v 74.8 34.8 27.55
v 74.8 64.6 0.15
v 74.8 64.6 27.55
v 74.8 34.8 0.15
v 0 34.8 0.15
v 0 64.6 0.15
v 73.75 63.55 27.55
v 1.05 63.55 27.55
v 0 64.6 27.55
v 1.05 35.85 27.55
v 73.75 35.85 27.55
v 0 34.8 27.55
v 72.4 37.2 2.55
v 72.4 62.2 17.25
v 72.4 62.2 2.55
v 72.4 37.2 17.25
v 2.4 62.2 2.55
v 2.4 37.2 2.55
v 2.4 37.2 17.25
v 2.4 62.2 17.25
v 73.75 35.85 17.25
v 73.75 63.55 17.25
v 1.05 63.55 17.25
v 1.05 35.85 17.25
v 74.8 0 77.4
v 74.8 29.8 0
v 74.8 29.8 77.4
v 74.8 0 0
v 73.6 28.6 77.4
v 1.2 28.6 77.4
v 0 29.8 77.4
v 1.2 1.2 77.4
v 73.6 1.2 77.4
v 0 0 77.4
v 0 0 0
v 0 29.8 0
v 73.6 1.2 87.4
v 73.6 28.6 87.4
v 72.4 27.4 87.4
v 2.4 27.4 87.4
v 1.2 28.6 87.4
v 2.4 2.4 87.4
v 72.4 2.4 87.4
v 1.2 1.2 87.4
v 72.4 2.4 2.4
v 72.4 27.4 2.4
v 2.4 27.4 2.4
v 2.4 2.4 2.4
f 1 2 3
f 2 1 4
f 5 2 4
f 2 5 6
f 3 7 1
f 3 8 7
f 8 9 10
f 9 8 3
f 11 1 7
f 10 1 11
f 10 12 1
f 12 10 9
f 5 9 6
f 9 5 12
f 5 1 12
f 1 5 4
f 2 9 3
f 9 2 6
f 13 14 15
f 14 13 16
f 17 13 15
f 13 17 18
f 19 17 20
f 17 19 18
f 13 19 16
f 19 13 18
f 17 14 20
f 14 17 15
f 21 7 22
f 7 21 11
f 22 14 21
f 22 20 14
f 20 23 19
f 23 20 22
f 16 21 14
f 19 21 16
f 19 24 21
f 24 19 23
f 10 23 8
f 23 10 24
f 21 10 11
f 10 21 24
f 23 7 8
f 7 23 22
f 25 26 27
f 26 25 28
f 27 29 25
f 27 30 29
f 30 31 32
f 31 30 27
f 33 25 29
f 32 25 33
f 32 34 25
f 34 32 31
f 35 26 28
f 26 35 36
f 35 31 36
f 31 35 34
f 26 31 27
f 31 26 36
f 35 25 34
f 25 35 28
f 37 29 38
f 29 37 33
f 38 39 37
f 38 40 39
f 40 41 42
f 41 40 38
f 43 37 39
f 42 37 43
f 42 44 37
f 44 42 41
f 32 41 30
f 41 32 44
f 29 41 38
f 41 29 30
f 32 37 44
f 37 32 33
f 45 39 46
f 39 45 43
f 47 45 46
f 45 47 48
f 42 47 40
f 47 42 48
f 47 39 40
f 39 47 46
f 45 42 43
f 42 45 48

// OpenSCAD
/*
 * @file parametric_box_example.scad
 * @brief Example of a parametric box with a lid
 * @copyright Cameron K. Brooks 2025
 * @license CC-BY-SA-4.0
 */

/* [Parameters] */

// Turn to false to disable generation of lid
show_lid = true; // [true, false]

// Turn to false to disable generation of the box
show_box = true; // [true, false]

// Turn to true to place the lid on the box
position = false; // [true, false]

// Turn to true to show the cross section
cross_section = false; // [true, false]

// this is the wall of the lip, the box is twice as thick
thickness = 1.2;

// internal x dimension
internal_width = 70;

// internal y dimension
internal_depth = 25;

// internal overall z dimension
internal_height = 100;

// this is taken of off the internal_z for the bottom height and acts as the lid internal height
internal_lid_height = 20;

// this is the height of the lip
lip_height = 10;

// Reduces lip wall thickness to create a clearance for the lid to fit, increase if the lid is too tight.
lip_allowance = 0.3;

zFite = $preview ? 0.1 : 0; // Value to prevent z-fighting during preview

// Call the module to generate the box
parametric_box(
  wall_thickness=thickness, internal_x=internal_width, internal_y=internal_depth,
  internal_z=internal_height, internal_lid_z=internal_lid_height, lip_z=lip_height,
  lip_allowance=lip_allowance, generate_lid=show_lid, generate_box=show_box,
  position_assembly=position, show_cross_section=cross_section
);

module parametric_box(
  wall_thickness,
  internal_x,
  internal_y,
  internal_z,
  internal_lid_z,
  lip_z,
  lip_allowance,
  generate_lid = false,
  generate_box = true,
  position_assembly = false,
  show_cross_section = false
) {
  // Calculated internal variables

  internal_botz = internal_z - internal_lid_z;

  lip_x = add_wall_thickness(internal_x, wall_thickness);
  lip_y = add_wall_thickness(internal_y, wall_thickness);

  outer_x = add_wall_thickness(lip_x, wall_thickness);
  outer_y = add_wall_thickness(lip_y, wall_thickness);

  outer_z_lid = add_wall_thickness(internal_lid_z - lip_z / 2, wall_thickness);
  outer_z_box = add_wall_thickness(internal_botz - lip_z / 2, wall_thickness);

  // Function to add wall thickness to a dimension
  function add_wall_thickness(dimension, thickness) = dimension + 2 * thickness;

  // Module to generate the box
  module bottom() {

    // Boolean difference of the lipped box and the internal box
    difference() {
      // Boolean union of the box and the lip
      union() {
        // Create the box
        cube([outer_x, outer_y, outer_z_box]);

        // Create the lip
        translate([wall_thickness, wall_thickness, outer_z_box]) cube([lip_x, lip_y, lip_z]);
      }

      // Cut out the internal box
      translate([2 * wall_thickness, 2 * wall_thickness, 2 * wall_thickness]) color("red")
          cube([internal_x, internal_y, internal_z]);
    }
  }

  // Module to generate the lid
  module lid() {
    // Boolean difference of the lid with the lip and the internal box
    difference() {

      // Create the lid
      cube([outer_x, outer_y, outer_z_lid + lip_z]);

      // Cut out the lip pocket
      translate([2 * wall_thickness, 2 * wall_thickness, -zFite / 2]) color("red")
          cube([internal_x, internal_y, internal_lid_z + lip_z / 2 + zFite]);

      // Cut out the internal box
      translate([wall_thickness - lip_allowance / 2, wall_thickness - lip_allowance / 2, -zFite / 2])
        color("red") cube([lip_x + lip_allowance, lip_y + lip_allowance, lip_z + lip_allowance]);
    }
  }

  // Module to create the cross section
  module create_cross_section(active = false) {
    if (active)
      difference() {
        children();
        translate([-zFite, -zFite, -zFite]) cube([outer_x * 2, outer_y / 2, internal_z * 2]);
      }
    else
      children();
  }

  // Conditional variables to position the lid and box
  lid_y_shift = position_assembly ? 0 : outer_y * 2 + 5;
  lid_z_shift = position_assembly ? outer_z_box : outer_z_lid + lip_z;
  lid_rot = position_assembly ? 0 : 180;

  if (generate_lid)
    translate([0, lid_y_shift, lid_z_shift + lip_allowance / 2]) create_cross_section(show_cross_section)
        rotate([lid_rot, 0, 0]) lid();

  if (generate_box)
    create_cross_section(show_cross_section) bottom();
}
